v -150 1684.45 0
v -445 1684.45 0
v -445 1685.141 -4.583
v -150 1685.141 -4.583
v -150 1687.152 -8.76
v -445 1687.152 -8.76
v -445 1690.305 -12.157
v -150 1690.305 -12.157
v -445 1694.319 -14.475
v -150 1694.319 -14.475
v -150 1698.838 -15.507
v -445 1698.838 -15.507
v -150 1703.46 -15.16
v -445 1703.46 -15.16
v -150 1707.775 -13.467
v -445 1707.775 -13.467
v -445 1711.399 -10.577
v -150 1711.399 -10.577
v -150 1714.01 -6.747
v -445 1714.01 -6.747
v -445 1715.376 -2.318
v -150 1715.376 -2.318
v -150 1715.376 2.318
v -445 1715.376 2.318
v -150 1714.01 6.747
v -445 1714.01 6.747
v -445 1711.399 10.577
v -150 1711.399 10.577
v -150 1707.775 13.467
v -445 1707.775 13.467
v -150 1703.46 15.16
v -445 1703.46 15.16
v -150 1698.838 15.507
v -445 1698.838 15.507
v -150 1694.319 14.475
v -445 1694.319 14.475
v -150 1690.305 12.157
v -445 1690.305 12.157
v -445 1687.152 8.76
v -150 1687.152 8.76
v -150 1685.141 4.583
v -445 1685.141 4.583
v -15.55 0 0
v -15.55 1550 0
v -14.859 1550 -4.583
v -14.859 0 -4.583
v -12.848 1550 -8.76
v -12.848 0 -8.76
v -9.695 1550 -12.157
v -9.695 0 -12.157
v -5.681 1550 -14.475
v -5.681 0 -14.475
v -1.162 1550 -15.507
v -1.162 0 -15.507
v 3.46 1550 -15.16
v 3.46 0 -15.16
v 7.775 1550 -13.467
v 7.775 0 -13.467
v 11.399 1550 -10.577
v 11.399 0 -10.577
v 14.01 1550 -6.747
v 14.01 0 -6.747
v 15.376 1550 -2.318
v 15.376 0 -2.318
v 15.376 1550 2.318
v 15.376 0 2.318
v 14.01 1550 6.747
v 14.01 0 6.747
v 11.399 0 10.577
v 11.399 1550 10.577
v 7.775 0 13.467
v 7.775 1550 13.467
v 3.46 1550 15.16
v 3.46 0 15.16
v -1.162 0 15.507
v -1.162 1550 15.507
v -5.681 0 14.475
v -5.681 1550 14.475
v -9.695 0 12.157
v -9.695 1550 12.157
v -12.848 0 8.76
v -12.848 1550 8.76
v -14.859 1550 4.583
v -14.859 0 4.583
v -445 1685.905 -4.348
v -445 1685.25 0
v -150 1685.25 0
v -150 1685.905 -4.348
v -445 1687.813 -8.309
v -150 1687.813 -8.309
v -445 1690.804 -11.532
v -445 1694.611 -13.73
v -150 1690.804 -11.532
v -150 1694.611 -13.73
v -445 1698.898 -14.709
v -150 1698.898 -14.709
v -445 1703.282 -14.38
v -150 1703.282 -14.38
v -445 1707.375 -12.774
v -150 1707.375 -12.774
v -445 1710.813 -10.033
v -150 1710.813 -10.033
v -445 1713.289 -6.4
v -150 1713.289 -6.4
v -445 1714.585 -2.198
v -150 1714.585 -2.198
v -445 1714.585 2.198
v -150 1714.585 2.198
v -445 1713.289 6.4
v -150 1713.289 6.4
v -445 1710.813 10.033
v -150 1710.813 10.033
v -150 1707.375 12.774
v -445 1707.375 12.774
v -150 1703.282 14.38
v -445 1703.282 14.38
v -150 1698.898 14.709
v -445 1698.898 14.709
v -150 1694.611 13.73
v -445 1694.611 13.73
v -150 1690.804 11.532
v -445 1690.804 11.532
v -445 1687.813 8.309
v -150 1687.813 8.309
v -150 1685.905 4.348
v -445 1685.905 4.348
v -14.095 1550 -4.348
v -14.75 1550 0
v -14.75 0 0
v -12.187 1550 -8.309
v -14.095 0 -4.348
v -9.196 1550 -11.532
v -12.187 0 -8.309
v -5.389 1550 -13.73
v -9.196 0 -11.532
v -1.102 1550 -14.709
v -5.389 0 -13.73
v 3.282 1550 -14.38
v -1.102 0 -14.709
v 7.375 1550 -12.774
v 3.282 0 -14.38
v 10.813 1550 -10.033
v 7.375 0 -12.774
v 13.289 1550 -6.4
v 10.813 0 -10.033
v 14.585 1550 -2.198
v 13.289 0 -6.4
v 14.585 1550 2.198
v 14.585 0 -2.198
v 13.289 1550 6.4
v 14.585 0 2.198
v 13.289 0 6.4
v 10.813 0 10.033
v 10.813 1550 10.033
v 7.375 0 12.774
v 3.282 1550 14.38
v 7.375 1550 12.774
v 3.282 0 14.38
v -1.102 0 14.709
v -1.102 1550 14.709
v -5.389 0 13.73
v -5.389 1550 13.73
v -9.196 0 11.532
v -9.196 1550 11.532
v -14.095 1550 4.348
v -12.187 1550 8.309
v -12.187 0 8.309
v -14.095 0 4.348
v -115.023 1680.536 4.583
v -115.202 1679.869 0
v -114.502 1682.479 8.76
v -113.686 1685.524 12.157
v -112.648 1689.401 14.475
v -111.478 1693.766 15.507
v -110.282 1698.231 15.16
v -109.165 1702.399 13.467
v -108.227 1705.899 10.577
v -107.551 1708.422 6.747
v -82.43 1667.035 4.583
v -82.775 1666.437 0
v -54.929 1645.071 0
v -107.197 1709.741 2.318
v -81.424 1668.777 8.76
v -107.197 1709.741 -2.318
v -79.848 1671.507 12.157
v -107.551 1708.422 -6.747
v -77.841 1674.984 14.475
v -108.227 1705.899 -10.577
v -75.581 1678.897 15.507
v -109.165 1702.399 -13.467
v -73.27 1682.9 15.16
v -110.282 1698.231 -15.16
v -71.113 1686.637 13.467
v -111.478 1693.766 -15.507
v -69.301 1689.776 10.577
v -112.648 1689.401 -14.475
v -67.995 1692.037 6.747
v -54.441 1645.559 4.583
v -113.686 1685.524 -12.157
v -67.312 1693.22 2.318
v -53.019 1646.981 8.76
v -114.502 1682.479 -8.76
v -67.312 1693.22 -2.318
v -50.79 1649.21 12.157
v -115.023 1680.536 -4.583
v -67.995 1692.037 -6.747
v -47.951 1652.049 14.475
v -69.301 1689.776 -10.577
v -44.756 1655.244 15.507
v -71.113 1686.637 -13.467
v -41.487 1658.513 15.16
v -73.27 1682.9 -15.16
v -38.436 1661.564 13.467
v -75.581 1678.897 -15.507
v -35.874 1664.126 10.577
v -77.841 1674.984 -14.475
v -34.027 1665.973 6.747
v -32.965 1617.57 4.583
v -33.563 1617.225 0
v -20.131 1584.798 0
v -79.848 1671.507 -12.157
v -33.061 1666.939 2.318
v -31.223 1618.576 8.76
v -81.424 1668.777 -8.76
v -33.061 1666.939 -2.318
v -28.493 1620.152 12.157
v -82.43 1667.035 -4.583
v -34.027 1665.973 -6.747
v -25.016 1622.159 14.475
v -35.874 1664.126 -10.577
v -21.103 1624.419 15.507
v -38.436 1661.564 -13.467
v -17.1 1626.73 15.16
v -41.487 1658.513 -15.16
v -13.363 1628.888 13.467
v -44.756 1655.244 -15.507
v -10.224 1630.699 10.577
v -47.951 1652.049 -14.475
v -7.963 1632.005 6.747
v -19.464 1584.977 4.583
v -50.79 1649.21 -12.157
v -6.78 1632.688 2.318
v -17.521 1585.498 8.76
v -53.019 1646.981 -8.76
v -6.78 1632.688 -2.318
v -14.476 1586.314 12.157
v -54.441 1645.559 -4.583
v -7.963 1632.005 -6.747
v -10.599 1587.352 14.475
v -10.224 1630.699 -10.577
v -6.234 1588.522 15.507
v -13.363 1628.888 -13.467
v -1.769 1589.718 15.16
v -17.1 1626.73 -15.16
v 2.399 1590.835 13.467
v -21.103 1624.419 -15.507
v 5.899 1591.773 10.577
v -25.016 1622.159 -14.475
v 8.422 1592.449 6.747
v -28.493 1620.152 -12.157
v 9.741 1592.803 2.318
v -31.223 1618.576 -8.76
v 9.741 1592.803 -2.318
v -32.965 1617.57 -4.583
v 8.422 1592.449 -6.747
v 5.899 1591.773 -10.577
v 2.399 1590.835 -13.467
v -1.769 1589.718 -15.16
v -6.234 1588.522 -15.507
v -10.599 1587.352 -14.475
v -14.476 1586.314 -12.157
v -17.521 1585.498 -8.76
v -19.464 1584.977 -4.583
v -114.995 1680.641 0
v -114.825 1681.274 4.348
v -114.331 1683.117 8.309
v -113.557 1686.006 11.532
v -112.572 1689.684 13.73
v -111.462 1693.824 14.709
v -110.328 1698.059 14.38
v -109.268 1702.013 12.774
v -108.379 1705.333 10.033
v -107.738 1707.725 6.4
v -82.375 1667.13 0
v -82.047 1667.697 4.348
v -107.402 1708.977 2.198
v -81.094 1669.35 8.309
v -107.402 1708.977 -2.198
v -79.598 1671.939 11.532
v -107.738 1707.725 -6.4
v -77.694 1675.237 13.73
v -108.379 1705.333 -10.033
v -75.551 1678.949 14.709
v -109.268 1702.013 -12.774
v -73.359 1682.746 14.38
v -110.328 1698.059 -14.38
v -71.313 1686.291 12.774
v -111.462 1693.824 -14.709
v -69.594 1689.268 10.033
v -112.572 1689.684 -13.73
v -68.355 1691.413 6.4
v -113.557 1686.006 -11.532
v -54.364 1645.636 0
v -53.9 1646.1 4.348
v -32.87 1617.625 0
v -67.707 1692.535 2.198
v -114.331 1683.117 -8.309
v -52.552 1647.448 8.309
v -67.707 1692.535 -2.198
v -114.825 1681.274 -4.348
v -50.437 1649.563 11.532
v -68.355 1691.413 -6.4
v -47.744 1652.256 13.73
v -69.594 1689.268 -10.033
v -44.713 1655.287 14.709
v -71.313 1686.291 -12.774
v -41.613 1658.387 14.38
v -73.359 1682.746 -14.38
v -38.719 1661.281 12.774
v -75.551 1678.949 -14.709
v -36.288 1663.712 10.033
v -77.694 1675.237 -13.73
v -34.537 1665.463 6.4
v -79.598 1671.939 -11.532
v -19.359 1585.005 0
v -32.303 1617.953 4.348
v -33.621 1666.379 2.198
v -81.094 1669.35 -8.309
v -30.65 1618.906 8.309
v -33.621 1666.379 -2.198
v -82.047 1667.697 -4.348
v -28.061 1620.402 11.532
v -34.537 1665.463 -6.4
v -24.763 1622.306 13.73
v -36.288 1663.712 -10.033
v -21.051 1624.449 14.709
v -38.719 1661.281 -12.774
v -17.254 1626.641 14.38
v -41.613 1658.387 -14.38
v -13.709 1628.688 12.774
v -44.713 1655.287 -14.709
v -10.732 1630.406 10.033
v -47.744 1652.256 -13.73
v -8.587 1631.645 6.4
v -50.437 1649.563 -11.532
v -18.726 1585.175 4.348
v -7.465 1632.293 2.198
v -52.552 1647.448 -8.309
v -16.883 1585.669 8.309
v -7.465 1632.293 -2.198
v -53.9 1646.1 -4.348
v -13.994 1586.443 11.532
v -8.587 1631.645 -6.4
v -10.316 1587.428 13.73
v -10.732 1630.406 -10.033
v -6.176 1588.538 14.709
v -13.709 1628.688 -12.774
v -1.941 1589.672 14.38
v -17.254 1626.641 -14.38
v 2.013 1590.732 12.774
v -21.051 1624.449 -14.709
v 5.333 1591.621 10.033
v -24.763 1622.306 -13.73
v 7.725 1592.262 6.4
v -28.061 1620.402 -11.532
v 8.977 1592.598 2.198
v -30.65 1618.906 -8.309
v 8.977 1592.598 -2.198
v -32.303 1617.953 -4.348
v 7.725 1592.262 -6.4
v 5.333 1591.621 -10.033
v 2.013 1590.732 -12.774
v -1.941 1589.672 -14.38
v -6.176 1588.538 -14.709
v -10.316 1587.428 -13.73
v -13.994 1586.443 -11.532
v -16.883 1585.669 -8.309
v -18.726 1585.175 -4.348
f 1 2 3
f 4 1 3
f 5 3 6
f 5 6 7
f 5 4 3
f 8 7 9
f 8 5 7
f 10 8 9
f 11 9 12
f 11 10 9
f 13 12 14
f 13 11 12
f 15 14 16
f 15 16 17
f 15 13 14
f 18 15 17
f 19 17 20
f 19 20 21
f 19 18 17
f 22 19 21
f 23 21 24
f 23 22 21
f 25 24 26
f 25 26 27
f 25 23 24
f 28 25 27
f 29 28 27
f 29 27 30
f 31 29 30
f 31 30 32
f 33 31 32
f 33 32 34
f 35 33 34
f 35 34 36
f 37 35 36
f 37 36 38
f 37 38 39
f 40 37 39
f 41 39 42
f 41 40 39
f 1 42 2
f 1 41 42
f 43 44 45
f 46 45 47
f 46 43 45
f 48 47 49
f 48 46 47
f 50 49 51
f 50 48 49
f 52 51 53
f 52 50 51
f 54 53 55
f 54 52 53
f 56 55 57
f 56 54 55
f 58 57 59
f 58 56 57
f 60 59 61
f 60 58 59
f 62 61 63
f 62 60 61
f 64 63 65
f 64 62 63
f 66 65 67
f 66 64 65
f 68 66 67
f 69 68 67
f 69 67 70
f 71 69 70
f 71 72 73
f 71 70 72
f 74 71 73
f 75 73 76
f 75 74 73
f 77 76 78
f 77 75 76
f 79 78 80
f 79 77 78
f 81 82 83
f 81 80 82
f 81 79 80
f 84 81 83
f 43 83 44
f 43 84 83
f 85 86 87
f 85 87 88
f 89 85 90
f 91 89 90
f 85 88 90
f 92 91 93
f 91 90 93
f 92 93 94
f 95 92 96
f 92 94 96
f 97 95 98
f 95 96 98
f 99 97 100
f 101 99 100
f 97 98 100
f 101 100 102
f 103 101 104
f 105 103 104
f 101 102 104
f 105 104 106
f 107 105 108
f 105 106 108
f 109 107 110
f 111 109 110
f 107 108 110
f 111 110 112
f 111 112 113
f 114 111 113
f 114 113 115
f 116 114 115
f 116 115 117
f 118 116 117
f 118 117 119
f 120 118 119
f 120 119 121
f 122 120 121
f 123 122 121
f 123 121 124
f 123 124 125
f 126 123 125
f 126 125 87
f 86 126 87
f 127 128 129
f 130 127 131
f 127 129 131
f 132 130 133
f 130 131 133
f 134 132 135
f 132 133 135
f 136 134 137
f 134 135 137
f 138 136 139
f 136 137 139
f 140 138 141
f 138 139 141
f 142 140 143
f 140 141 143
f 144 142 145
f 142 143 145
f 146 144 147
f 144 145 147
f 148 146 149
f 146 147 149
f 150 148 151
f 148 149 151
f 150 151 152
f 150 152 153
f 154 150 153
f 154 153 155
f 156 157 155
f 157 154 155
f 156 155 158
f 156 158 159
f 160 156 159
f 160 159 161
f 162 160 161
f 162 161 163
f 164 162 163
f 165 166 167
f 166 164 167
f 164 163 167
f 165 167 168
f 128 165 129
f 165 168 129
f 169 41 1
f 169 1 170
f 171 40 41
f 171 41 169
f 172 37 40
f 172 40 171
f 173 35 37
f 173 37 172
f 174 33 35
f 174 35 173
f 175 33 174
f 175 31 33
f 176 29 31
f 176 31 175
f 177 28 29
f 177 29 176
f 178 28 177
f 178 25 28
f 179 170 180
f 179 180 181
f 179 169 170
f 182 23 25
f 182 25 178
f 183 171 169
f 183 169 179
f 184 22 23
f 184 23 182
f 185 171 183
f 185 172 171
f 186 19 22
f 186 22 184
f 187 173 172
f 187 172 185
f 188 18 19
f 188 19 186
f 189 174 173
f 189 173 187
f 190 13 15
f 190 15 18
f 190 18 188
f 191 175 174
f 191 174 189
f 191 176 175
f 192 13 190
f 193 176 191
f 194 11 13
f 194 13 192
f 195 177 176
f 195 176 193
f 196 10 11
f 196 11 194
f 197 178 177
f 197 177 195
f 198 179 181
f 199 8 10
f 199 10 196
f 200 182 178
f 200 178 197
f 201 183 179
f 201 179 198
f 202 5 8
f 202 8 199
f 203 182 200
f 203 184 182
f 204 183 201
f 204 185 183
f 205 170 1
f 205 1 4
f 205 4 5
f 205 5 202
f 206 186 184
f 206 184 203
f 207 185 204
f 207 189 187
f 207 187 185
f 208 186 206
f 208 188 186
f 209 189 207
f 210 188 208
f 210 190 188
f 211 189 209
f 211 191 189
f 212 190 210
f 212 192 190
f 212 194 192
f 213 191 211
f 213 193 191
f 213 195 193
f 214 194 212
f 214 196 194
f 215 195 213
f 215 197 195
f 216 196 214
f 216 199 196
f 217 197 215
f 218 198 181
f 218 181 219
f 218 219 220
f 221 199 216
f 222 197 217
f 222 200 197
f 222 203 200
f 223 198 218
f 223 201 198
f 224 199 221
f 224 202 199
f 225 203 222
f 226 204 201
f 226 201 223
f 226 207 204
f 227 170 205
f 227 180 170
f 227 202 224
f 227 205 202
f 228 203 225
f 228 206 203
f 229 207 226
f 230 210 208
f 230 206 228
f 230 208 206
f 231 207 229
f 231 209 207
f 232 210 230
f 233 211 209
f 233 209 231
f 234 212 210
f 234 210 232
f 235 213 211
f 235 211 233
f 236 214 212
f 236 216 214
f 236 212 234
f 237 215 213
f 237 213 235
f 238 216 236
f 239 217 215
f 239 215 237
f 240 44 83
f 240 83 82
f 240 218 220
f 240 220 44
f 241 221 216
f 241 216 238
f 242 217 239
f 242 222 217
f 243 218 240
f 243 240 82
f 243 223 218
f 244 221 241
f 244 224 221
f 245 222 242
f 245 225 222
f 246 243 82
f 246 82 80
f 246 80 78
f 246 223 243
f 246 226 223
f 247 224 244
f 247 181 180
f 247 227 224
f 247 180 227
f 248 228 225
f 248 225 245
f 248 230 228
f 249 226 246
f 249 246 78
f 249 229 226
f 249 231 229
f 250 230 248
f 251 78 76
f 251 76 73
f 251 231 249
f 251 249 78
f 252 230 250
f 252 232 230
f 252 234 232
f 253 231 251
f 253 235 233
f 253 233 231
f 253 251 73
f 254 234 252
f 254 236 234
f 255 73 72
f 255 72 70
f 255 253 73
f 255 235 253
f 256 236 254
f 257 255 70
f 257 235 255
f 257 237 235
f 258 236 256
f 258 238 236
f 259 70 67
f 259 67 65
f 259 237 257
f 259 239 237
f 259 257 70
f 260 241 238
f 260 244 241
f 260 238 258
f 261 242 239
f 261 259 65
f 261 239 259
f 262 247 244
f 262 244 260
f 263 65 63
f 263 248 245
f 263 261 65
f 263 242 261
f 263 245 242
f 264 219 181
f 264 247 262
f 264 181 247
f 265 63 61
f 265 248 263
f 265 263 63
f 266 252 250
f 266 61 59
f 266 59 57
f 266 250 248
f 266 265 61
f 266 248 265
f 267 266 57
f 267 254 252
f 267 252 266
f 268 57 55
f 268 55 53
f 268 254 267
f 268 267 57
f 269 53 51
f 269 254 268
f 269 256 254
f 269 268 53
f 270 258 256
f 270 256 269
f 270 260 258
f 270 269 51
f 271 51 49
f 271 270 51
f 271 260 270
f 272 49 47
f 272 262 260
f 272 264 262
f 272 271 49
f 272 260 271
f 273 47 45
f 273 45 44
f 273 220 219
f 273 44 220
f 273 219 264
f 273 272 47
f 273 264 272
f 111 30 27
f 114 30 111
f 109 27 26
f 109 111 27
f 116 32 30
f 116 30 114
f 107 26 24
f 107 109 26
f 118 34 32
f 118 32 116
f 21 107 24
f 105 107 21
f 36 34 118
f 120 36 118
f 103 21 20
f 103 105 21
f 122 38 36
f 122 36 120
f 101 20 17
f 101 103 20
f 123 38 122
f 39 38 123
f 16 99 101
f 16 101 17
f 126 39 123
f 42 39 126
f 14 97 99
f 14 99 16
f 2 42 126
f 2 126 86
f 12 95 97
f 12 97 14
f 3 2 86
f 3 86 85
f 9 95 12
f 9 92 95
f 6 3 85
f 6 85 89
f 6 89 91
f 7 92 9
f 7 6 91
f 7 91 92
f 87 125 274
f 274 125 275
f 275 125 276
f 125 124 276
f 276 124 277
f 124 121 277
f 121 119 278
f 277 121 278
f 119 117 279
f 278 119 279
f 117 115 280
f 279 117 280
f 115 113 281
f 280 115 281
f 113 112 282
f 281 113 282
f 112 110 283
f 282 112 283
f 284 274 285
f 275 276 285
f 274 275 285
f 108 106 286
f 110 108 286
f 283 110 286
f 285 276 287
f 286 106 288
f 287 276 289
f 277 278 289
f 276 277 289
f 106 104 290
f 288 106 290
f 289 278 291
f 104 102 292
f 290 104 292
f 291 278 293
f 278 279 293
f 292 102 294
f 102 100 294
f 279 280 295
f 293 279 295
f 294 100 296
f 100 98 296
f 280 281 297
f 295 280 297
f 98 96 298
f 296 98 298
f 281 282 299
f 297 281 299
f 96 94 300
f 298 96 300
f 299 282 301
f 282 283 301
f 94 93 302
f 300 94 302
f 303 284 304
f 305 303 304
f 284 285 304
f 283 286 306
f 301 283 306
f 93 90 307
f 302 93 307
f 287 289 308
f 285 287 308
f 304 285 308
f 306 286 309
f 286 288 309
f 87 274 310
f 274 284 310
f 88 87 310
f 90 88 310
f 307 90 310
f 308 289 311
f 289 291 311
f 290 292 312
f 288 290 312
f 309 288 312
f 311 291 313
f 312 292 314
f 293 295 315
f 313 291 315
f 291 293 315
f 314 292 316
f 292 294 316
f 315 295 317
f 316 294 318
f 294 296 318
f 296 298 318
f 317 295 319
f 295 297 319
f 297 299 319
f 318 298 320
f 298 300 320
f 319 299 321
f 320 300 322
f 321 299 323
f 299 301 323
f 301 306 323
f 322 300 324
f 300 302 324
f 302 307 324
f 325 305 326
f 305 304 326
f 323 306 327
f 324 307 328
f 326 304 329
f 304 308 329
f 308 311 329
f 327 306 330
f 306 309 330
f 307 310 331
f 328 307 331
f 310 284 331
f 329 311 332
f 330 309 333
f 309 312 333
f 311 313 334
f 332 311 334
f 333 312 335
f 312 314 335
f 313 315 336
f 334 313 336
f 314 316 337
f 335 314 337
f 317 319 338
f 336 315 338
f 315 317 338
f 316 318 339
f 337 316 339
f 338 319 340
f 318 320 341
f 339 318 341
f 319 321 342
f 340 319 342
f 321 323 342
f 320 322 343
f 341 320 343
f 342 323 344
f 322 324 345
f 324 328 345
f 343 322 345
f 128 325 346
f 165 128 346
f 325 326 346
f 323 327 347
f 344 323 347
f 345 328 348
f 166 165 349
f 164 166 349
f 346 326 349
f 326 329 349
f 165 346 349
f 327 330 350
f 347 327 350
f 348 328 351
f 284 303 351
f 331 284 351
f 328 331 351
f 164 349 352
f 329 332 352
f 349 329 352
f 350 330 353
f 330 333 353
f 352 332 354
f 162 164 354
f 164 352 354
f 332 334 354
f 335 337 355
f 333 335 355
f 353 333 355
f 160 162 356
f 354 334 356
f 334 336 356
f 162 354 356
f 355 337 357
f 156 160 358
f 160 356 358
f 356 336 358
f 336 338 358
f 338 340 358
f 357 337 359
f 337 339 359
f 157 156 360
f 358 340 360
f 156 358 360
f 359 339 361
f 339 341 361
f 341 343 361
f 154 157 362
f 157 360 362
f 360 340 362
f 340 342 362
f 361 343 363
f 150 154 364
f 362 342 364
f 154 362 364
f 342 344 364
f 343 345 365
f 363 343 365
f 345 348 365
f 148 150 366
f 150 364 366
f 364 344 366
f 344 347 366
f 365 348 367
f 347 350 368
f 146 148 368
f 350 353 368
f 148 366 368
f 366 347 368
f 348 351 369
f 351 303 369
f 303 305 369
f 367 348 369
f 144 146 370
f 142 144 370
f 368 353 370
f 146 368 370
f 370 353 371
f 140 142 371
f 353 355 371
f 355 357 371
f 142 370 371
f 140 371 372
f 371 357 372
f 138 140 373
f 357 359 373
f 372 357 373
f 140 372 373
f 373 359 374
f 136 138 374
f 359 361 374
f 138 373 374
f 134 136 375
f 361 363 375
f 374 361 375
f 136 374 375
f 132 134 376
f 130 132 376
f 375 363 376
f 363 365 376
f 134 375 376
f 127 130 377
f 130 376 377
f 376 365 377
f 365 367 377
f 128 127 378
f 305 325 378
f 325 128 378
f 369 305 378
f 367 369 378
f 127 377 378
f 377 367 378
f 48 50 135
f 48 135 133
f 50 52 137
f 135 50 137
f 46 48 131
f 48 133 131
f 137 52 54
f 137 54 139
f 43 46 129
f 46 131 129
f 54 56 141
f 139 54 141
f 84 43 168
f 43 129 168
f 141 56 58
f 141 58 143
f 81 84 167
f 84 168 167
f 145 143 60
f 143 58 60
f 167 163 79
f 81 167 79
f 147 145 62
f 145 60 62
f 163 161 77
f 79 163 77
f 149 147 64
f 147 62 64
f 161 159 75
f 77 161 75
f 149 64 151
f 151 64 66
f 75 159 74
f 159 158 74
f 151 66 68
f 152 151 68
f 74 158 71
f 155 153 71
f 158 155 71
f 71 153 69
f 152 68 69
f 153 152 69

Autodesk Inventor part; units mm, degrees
ref_plane "YZ Plane" through (0, 0, 0) normal (1, 0, 0) x (0, 1, 0)
ref_plane "XZ Plane" through (0, 0, 0) normal (0, 1, 0) x (-1, 0, 0)
ref_plane "XY Plane" through (0, 0, 0) normal (0, 0, 1) x (1, 0, 0)
sketch "Sketch1" plane through (0, 0, 0) normal (0, 1, 0) x (-1, 0, 0)
  circle A0 centre (0, 0) radius 15.55
  circle A1 centre (0, 0) radius 14.75
  dimension "d0" = 31.1
  dimension "d1" = 29.5
sketch "Sketch2" plane through (0, 0, 0) normal (0, 0, 1) x (1, 0, 0)
  line L0 (-445, 1700) -> (-150, 1700)
  line L1 (0, 1550) -> (0, 0)
  arc A0 (0, 1550) -> (-150, 1700) centre (-150, 1550) ccw
  point P0 (0, 1700)
  dimension "d4" = 445
  dimension "d6" = 150
  dimension "d9" = 1700
sweep "Sweep1" add profiles "Sketch1" path "Sketch2"
properties part number "SP13V1 Tubo Baranda" material "Acero, carbono"
